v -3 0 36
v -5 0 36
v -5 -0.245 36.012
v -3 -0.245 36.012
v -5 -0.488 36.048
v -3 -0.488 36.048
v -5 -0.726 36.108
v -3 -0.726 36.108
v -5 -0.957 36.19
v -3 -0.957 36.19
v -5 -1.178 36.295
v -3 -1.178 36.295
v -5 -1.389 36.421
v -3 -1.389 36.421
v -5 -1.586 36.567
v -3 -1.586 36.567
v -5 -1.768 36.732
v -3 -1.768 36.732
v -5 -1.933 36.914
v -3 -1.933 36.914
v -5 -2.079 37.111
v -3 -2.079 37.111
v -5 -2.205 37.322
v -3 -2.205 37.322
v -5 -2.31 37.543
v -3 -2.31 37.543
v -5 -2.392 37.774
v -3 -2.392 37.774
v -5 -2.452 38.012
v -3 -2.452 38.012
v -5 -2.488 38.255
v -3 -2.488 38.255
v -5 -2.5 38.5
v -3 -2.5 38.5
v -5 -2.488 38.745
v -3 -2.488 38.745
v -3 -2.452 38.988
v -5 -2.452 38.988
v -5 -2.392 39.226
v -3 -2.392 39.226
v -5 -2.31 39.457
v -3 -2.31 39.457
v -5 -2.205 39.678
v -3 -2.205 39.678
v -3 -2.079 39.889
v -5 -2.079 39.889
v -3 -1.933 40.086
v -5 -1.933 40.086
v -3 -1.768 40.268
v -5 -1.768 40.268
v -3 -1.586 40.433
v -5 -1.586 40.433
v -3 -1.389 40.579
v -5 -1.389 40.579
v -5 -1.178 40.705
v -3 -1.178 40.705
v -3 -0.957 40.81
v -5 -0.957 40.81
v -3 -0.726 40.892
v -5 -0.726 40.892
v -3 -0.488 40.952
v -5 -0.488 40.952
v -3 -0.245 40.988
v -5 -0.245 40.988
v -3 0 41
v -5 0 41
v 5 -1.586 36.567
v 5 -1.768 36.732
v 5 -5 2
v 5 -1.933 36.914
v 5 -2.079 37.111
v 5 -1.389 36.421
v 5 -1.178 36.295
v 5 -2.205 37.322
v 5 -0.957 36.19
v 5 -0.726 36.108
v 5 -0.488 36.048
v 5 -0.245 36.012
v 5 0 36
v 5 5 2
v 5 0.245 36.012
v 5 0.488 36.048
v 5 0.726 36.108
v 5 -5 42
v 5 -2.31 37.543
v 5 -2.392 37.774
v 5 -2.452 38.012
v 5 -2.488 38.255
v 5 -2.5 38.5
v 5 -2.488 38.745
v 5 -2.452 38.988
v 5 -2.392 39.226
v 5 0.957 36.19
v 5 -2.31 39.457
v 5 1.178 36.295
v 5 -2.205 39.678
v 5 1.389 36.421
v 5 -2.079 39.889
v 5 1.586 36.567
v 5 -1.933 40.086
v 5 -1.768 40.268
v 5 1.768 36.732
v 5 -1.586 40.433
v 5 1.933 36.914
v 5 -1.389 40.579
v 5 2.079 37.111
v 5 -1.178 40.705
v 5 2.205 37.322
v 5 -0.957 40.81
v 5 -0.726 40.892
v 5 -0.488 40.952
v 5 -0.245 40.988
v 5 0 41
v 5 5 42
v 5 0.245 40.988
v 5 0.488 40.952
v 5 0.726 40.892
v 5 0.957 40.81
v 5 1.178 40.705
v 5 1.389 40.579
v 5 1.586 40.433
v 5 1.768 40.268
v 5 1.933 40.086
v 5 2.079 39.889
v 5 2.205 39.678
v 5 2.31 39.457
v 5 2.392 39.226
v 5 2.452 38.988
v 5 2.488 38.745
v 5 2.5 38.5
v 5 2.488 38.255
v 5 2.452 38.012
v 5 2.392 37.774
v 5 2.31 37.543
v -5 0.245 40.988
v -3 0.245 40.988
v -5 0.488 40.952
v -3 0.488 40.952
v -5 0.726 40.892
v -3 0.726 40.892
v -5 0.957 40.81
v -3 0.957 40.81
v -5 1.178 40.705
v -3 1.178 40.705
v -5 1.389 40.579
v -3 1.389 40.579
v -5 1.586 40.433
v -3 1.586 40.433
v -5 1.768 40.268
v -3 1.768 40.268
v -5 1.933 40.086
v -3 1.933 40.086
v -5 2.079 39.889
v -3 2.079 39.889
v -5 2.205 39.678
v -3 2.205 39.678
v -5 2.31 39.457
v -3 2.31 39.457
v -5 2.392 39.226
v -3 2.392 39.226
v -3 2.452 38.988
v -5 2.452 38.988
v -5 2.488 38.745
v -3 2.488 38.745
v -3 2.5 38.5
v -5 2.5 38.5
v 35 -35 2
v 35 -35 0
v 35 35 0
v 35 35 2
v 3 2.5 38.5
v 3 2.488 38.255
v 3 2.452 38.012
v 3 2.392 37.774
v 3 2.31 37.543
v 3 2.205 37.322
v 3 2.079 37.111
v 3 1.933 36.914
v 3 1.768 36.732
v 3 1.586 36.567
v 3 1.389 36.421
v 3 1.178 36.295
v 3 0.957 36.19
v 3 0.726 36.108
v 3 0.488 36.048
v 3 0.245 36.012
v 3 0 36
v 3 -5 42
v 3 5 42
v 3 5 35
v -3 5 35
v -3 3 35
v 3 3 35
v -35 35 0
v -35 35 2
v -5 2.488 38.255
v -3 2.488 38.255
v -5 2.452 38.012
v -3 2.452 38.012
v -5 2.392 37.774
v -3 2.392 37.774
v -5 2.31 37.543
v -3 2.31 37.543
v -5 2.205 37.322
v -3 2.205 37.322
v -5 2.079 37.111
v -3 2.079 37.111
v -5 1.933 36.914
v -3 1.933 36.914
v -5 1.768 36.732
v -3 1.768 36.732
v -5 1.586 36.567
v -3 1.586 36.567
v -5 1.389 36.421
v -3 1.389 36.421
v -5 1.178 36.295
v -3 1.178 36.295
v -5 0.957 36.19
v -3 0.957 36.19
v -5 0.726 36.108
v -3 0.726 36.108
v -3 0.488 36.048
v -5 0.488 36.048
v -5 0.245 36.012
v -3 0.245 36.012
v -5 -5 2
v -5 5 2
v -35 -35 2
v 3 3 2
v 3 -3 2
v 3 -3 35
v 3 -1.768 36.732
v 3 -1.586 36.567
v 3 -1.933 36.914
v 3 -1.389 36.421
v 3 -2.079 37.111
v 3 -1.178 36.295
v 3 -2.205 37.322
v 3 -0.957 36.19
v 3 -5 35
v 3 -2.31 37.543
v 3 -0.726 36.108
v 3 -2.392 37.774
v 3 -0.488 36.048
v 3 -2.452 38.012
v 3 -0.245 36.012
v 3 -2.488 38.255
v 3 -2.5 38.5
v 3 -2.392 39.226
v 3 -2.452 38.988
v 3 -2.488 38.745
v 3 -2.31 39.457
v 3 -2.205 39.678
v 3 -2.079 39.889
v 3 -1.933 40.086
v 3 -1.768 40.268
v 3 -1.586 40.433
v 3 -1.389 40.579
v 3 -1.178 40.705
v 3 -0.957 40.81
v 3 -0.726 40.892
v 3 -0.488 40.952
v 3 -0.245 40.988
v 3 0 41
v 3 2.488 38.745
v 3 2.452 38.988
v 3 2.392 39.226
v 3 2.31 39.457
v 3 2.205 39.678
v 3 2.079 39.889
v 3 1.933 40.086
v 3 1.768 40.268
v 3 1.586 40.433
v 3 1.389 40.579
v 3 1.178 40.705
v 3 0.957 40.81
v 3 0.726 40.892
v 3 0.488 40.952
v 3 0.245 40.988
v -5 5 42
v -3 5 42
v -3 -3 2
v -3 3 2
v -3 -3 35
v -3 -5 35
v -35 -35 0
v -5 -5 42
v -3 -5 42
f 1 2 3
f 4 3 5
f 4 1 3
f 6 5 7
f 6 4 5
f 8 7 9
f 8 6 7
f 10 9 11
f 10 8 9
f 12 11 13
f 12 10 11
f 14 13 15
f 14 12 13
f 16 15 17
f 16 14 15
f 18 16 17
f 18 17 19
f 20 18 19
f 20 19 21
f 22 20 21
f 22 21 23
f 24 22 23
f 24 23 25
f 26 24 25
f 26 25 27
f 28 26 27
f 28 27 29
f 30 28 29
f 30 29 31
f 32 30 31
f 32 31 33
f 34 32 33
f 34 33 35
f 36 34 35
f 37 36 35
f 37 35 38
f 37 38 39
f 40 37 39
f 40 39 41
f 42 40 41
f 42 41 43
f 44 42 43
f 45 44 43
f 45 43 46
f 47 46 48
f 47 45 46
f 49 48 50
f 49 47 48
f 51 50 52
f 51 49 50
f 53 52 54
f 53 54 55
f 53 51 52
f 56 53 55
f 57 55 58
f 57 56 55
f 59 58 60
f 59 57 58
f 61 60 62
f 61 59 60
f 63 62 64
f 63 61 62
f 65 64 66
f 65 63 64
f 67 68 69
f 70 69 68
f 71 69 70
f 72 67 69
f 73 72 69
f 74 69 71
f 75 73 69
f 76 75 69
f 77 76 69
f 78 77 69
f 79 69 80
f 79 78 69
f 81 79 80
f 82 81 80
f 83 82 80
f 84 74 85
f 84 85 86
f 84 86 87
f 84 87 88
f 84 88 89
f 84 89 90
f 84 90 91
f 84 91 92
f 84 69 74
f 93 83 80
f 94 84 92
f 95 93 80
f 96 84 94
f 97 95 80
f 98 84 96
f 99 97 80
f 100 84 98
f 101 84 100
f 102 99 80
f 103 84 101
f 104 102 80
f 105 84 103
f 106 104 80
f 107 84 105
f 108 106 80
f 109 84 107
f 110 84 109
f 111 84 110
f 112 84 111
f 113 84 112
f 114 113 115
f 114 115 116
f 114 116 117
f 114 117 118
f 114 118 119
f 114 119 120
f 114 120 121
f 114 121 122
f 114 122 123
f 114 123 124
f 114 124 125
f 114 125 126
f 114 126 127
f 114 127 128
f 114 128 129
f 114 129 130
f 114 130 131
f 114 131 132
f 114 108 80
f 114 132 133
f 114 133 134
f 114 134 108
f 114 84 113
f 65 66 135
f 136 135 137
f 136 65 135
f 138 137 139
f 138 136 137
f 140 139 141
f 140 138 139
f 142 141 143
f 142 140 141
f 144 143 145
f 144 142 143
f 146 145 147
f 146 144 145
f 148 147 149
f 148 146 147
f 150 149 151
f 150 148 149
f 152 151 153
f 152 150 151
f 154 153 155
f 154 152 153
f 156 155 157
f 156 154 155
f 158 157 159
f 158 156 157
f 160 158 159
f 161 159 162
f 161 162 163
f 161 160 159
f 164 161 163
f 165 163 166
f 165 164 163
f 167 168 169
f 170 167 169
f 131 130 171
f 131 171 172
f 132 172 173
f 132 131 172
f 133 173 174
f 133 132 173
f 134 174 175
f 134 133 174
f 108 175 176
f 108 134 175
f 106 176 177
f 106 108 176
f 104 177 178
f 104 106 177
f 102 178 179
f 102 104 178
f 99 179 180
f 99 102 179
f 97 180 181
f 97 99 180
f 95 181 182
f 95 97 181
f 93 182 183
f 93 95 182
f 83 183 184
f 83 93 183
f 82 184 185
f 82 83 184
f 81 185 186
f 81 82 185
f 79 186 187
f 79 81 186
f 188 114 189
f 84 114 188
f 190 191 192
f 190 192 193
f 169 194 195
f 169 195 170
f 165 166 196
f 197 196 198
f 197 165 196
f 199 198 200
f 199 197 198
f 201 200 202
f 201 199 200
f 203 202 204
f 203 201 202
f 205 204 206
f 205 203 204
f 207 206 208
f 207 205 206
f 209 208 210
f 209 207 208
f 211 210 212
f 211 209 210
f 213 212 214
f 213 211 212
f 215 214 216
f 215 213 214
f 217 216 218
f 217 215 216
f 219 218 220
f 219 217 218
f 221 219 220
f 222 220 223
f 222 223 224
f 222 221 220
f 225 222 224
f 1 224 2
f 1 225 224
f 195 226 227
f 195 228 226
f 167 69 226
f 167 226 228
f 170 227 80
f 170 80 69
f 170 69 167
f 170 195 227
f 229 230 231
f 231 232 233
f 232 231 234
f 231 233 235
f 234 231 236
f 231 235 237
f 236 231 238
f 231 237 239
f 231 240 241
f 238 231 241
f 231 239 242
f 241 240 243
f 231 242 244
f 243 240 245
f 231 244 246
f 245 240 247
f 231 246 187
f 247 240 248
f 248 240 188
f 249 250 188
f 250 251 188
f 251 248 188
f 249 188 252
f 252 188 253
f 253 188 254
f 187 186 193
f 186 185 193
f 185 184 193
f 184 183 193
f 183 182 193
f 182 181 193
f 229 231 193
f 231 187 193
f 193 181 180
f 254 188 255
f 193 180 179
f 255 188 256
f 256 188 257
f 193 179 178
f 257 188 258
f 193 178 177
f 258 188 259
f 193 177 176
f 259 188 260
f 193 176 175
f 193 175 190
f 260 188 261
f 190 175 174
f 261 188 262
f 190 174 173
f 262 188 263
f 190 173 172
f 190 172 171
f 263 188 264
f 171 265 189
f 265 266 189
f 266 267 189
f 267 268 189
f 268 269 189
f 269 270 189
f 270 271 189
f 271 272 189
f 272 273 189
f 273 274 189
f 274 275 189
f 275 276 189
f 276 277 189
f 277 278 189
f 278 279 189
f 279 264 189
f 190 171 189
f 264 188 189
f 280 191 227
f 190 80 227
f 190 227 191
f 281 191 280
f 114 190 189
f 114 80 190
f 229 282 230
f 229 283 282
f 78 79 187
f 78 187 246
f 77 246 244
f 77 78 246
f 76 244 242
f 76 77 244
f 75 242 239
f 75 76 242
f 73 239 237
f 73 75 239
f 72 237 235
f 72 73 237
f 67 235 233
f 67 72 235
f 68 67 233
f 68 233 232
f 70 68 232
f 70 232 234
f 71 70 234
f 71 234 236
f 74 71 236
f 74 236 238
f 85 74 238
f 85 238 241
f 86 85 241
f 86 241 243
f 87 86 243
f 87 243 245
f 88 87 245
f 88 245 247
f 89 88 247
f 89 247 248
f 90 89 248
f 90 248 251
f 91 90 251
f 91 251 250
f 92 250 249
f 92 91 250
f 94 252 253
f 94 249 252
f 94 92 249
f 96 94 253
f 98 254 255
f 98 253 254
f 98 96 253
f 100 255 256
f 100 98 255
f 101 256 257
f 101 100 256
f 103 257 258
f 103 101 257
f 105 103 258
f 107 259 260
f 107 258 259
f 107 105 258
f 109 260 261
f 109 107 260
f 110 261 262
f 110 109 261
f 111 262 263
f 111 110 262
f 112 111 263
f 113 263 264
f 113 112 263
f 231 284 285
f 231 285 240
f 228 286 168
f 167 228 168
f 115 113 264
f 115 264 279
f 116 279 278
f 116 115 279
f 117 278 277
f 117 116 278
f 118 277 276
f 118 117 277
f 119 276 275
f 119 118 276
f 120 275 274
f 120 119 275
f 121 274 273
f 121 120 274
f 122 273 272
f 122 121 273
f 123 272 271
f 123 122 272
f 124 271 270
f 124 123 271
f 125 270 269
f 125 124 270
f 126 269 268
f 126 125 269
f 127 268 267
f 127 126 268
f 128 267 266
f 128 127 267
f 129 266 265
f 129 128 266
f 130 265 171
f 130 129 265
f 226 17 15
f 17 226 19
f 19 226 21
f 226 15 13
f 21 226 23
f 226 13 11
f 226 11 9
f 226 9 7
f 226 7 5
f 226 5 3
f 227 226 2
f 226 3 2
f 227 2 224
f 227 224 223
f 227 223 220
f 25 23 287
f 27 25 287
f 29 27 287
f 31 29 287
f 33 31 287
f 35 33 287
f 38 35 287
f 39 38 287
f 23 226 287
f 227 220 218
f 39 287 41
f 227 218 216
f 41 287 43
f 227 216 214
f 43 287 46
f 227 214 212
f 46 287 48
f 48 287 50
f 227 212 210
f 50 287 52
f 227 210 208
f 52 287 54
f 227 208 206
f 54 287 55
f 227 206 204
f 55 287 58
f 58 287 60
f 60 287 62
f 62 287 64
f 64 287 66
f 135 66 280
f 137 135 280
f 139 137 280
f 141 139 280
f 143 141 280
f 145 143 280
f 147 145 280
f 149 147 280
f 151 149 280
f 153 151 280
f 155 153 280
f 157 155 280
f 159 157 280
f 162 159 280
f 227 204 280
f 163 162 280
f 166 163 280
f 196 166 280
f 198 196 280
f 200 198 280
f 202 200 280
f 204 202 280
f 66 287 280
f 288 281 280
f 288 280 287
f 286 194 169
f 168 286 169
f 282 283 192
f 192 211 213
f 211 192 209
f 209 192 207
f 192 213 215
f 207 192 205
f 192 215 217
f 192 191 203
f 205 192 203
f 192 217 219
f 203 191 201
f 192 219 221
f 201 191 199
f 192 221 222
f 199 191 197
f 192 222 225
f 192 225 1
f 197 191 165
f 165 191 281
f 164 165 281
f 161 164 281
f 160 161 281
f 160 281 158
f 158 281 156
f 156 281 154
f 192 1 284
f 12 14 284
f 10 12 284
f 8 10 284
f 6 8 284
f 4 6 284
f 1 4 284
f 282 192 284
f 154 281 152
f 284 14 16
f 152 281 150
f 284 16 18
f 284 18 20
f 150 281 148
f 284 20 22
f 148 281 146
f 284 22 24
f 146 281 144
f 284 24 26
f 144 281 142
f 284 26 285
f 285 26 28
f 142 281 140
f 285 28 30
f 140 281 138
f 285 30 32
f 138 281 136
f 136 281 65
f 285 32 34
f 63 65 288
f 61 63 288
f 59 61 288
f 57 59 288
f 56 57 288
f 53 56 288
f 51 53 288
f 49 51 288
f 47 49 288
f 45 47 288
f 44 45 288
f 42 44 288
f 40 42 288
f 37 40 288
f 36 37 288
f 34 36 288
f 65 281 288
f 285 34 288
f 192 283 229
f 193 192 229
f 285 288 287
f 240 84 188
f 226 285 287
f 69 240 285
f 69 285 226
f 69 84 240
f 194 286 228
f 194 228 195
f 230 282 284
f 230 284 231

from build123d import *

# Parameters (mm, degrees)
F0_W     = 70
F0_H     = 70
F0_W_2   = 10
F0_H_2   = 10
F0_W_3   = 6
F0_H_3   = 6
F1_DEPTH = 2
F2_DEPTH = 35
F4_DEPTH = 10
F5_W     = 6
F5_H     = 2
F5_H_2   = 6
F6_DEPTH = 7


with BuildPart() as f1:
    # F0 (on Top) → F1 (new body)
    with BuildSketch(Plane.XY):
        Rectangle(F0_W, F0_H)
        Rectangle(F0_W_2, F0_H_2, mode=Mode.SUBTRACT)
        Rectangle(F0_W_2, F0_H_2)
        Rectangle(F0_W_3, F0_H_3, mode=Mode.SUBTRACT)
        Rectangle(F0_W_3, F0_H_3)
    extrude(amount=F1_DEPTH)

    # F0 (on Top) → F2 (join)
    with BuildSketch(Plane.XY):
        Rectangle(F0_W_2, F0_H_2)
        Rectangle(F0_W_3, F0_H_3, mode=Mode.SUBTRACT)
    extrude(amount=F2_DEPTH)

    # F3 (on face) → F4 (join)
    with BuildSketch(Plane.YZ.offset(5)):
        with BuildLine():
            Line((-5, 42), (-5, 35))
            Line((-5, 35), (0, 35))
            Line((0, 35), (0, 36))
            ThreePointArc((0, 36), (-2.5, 38.5), (0, 41))
            Line((0, 41), (0, 42))
            Line((0, 42), (-5, 42))
        make_face()
        with BuildLine():
            Line((0, 36), (0, 35))
            Line((0, 35), (5, 35))
            Line((5, 35), (5, 42))
            Line((5, 42), (0, 42))
            Line((0, 42), (0, 41))
            ThreePointArc((0, 41), (1.767766953, 40.267766953), (2.5, 38.5))
            ThreePointArc((2.5, 38.5), (1.767766953, 36.732233047), (0, 36))
        make_face()
    extrude(amount=-F4_DEPTH)

    # F5 (on face) → F6 (cut)
    with BuildSketch(Plane.XY.offset(42)):
        with Locations((0, -4)):
            Rectangle(F5_W, F5_H)
        Rectangle(F5_W, F5_H_2)
        with Locations((0, 4)):
            Rectangle(F5_W, F5_H)
    extrude(amount=-F6_DEPTH, mode=Mode.SUBTRACT)


solid = f1.part
